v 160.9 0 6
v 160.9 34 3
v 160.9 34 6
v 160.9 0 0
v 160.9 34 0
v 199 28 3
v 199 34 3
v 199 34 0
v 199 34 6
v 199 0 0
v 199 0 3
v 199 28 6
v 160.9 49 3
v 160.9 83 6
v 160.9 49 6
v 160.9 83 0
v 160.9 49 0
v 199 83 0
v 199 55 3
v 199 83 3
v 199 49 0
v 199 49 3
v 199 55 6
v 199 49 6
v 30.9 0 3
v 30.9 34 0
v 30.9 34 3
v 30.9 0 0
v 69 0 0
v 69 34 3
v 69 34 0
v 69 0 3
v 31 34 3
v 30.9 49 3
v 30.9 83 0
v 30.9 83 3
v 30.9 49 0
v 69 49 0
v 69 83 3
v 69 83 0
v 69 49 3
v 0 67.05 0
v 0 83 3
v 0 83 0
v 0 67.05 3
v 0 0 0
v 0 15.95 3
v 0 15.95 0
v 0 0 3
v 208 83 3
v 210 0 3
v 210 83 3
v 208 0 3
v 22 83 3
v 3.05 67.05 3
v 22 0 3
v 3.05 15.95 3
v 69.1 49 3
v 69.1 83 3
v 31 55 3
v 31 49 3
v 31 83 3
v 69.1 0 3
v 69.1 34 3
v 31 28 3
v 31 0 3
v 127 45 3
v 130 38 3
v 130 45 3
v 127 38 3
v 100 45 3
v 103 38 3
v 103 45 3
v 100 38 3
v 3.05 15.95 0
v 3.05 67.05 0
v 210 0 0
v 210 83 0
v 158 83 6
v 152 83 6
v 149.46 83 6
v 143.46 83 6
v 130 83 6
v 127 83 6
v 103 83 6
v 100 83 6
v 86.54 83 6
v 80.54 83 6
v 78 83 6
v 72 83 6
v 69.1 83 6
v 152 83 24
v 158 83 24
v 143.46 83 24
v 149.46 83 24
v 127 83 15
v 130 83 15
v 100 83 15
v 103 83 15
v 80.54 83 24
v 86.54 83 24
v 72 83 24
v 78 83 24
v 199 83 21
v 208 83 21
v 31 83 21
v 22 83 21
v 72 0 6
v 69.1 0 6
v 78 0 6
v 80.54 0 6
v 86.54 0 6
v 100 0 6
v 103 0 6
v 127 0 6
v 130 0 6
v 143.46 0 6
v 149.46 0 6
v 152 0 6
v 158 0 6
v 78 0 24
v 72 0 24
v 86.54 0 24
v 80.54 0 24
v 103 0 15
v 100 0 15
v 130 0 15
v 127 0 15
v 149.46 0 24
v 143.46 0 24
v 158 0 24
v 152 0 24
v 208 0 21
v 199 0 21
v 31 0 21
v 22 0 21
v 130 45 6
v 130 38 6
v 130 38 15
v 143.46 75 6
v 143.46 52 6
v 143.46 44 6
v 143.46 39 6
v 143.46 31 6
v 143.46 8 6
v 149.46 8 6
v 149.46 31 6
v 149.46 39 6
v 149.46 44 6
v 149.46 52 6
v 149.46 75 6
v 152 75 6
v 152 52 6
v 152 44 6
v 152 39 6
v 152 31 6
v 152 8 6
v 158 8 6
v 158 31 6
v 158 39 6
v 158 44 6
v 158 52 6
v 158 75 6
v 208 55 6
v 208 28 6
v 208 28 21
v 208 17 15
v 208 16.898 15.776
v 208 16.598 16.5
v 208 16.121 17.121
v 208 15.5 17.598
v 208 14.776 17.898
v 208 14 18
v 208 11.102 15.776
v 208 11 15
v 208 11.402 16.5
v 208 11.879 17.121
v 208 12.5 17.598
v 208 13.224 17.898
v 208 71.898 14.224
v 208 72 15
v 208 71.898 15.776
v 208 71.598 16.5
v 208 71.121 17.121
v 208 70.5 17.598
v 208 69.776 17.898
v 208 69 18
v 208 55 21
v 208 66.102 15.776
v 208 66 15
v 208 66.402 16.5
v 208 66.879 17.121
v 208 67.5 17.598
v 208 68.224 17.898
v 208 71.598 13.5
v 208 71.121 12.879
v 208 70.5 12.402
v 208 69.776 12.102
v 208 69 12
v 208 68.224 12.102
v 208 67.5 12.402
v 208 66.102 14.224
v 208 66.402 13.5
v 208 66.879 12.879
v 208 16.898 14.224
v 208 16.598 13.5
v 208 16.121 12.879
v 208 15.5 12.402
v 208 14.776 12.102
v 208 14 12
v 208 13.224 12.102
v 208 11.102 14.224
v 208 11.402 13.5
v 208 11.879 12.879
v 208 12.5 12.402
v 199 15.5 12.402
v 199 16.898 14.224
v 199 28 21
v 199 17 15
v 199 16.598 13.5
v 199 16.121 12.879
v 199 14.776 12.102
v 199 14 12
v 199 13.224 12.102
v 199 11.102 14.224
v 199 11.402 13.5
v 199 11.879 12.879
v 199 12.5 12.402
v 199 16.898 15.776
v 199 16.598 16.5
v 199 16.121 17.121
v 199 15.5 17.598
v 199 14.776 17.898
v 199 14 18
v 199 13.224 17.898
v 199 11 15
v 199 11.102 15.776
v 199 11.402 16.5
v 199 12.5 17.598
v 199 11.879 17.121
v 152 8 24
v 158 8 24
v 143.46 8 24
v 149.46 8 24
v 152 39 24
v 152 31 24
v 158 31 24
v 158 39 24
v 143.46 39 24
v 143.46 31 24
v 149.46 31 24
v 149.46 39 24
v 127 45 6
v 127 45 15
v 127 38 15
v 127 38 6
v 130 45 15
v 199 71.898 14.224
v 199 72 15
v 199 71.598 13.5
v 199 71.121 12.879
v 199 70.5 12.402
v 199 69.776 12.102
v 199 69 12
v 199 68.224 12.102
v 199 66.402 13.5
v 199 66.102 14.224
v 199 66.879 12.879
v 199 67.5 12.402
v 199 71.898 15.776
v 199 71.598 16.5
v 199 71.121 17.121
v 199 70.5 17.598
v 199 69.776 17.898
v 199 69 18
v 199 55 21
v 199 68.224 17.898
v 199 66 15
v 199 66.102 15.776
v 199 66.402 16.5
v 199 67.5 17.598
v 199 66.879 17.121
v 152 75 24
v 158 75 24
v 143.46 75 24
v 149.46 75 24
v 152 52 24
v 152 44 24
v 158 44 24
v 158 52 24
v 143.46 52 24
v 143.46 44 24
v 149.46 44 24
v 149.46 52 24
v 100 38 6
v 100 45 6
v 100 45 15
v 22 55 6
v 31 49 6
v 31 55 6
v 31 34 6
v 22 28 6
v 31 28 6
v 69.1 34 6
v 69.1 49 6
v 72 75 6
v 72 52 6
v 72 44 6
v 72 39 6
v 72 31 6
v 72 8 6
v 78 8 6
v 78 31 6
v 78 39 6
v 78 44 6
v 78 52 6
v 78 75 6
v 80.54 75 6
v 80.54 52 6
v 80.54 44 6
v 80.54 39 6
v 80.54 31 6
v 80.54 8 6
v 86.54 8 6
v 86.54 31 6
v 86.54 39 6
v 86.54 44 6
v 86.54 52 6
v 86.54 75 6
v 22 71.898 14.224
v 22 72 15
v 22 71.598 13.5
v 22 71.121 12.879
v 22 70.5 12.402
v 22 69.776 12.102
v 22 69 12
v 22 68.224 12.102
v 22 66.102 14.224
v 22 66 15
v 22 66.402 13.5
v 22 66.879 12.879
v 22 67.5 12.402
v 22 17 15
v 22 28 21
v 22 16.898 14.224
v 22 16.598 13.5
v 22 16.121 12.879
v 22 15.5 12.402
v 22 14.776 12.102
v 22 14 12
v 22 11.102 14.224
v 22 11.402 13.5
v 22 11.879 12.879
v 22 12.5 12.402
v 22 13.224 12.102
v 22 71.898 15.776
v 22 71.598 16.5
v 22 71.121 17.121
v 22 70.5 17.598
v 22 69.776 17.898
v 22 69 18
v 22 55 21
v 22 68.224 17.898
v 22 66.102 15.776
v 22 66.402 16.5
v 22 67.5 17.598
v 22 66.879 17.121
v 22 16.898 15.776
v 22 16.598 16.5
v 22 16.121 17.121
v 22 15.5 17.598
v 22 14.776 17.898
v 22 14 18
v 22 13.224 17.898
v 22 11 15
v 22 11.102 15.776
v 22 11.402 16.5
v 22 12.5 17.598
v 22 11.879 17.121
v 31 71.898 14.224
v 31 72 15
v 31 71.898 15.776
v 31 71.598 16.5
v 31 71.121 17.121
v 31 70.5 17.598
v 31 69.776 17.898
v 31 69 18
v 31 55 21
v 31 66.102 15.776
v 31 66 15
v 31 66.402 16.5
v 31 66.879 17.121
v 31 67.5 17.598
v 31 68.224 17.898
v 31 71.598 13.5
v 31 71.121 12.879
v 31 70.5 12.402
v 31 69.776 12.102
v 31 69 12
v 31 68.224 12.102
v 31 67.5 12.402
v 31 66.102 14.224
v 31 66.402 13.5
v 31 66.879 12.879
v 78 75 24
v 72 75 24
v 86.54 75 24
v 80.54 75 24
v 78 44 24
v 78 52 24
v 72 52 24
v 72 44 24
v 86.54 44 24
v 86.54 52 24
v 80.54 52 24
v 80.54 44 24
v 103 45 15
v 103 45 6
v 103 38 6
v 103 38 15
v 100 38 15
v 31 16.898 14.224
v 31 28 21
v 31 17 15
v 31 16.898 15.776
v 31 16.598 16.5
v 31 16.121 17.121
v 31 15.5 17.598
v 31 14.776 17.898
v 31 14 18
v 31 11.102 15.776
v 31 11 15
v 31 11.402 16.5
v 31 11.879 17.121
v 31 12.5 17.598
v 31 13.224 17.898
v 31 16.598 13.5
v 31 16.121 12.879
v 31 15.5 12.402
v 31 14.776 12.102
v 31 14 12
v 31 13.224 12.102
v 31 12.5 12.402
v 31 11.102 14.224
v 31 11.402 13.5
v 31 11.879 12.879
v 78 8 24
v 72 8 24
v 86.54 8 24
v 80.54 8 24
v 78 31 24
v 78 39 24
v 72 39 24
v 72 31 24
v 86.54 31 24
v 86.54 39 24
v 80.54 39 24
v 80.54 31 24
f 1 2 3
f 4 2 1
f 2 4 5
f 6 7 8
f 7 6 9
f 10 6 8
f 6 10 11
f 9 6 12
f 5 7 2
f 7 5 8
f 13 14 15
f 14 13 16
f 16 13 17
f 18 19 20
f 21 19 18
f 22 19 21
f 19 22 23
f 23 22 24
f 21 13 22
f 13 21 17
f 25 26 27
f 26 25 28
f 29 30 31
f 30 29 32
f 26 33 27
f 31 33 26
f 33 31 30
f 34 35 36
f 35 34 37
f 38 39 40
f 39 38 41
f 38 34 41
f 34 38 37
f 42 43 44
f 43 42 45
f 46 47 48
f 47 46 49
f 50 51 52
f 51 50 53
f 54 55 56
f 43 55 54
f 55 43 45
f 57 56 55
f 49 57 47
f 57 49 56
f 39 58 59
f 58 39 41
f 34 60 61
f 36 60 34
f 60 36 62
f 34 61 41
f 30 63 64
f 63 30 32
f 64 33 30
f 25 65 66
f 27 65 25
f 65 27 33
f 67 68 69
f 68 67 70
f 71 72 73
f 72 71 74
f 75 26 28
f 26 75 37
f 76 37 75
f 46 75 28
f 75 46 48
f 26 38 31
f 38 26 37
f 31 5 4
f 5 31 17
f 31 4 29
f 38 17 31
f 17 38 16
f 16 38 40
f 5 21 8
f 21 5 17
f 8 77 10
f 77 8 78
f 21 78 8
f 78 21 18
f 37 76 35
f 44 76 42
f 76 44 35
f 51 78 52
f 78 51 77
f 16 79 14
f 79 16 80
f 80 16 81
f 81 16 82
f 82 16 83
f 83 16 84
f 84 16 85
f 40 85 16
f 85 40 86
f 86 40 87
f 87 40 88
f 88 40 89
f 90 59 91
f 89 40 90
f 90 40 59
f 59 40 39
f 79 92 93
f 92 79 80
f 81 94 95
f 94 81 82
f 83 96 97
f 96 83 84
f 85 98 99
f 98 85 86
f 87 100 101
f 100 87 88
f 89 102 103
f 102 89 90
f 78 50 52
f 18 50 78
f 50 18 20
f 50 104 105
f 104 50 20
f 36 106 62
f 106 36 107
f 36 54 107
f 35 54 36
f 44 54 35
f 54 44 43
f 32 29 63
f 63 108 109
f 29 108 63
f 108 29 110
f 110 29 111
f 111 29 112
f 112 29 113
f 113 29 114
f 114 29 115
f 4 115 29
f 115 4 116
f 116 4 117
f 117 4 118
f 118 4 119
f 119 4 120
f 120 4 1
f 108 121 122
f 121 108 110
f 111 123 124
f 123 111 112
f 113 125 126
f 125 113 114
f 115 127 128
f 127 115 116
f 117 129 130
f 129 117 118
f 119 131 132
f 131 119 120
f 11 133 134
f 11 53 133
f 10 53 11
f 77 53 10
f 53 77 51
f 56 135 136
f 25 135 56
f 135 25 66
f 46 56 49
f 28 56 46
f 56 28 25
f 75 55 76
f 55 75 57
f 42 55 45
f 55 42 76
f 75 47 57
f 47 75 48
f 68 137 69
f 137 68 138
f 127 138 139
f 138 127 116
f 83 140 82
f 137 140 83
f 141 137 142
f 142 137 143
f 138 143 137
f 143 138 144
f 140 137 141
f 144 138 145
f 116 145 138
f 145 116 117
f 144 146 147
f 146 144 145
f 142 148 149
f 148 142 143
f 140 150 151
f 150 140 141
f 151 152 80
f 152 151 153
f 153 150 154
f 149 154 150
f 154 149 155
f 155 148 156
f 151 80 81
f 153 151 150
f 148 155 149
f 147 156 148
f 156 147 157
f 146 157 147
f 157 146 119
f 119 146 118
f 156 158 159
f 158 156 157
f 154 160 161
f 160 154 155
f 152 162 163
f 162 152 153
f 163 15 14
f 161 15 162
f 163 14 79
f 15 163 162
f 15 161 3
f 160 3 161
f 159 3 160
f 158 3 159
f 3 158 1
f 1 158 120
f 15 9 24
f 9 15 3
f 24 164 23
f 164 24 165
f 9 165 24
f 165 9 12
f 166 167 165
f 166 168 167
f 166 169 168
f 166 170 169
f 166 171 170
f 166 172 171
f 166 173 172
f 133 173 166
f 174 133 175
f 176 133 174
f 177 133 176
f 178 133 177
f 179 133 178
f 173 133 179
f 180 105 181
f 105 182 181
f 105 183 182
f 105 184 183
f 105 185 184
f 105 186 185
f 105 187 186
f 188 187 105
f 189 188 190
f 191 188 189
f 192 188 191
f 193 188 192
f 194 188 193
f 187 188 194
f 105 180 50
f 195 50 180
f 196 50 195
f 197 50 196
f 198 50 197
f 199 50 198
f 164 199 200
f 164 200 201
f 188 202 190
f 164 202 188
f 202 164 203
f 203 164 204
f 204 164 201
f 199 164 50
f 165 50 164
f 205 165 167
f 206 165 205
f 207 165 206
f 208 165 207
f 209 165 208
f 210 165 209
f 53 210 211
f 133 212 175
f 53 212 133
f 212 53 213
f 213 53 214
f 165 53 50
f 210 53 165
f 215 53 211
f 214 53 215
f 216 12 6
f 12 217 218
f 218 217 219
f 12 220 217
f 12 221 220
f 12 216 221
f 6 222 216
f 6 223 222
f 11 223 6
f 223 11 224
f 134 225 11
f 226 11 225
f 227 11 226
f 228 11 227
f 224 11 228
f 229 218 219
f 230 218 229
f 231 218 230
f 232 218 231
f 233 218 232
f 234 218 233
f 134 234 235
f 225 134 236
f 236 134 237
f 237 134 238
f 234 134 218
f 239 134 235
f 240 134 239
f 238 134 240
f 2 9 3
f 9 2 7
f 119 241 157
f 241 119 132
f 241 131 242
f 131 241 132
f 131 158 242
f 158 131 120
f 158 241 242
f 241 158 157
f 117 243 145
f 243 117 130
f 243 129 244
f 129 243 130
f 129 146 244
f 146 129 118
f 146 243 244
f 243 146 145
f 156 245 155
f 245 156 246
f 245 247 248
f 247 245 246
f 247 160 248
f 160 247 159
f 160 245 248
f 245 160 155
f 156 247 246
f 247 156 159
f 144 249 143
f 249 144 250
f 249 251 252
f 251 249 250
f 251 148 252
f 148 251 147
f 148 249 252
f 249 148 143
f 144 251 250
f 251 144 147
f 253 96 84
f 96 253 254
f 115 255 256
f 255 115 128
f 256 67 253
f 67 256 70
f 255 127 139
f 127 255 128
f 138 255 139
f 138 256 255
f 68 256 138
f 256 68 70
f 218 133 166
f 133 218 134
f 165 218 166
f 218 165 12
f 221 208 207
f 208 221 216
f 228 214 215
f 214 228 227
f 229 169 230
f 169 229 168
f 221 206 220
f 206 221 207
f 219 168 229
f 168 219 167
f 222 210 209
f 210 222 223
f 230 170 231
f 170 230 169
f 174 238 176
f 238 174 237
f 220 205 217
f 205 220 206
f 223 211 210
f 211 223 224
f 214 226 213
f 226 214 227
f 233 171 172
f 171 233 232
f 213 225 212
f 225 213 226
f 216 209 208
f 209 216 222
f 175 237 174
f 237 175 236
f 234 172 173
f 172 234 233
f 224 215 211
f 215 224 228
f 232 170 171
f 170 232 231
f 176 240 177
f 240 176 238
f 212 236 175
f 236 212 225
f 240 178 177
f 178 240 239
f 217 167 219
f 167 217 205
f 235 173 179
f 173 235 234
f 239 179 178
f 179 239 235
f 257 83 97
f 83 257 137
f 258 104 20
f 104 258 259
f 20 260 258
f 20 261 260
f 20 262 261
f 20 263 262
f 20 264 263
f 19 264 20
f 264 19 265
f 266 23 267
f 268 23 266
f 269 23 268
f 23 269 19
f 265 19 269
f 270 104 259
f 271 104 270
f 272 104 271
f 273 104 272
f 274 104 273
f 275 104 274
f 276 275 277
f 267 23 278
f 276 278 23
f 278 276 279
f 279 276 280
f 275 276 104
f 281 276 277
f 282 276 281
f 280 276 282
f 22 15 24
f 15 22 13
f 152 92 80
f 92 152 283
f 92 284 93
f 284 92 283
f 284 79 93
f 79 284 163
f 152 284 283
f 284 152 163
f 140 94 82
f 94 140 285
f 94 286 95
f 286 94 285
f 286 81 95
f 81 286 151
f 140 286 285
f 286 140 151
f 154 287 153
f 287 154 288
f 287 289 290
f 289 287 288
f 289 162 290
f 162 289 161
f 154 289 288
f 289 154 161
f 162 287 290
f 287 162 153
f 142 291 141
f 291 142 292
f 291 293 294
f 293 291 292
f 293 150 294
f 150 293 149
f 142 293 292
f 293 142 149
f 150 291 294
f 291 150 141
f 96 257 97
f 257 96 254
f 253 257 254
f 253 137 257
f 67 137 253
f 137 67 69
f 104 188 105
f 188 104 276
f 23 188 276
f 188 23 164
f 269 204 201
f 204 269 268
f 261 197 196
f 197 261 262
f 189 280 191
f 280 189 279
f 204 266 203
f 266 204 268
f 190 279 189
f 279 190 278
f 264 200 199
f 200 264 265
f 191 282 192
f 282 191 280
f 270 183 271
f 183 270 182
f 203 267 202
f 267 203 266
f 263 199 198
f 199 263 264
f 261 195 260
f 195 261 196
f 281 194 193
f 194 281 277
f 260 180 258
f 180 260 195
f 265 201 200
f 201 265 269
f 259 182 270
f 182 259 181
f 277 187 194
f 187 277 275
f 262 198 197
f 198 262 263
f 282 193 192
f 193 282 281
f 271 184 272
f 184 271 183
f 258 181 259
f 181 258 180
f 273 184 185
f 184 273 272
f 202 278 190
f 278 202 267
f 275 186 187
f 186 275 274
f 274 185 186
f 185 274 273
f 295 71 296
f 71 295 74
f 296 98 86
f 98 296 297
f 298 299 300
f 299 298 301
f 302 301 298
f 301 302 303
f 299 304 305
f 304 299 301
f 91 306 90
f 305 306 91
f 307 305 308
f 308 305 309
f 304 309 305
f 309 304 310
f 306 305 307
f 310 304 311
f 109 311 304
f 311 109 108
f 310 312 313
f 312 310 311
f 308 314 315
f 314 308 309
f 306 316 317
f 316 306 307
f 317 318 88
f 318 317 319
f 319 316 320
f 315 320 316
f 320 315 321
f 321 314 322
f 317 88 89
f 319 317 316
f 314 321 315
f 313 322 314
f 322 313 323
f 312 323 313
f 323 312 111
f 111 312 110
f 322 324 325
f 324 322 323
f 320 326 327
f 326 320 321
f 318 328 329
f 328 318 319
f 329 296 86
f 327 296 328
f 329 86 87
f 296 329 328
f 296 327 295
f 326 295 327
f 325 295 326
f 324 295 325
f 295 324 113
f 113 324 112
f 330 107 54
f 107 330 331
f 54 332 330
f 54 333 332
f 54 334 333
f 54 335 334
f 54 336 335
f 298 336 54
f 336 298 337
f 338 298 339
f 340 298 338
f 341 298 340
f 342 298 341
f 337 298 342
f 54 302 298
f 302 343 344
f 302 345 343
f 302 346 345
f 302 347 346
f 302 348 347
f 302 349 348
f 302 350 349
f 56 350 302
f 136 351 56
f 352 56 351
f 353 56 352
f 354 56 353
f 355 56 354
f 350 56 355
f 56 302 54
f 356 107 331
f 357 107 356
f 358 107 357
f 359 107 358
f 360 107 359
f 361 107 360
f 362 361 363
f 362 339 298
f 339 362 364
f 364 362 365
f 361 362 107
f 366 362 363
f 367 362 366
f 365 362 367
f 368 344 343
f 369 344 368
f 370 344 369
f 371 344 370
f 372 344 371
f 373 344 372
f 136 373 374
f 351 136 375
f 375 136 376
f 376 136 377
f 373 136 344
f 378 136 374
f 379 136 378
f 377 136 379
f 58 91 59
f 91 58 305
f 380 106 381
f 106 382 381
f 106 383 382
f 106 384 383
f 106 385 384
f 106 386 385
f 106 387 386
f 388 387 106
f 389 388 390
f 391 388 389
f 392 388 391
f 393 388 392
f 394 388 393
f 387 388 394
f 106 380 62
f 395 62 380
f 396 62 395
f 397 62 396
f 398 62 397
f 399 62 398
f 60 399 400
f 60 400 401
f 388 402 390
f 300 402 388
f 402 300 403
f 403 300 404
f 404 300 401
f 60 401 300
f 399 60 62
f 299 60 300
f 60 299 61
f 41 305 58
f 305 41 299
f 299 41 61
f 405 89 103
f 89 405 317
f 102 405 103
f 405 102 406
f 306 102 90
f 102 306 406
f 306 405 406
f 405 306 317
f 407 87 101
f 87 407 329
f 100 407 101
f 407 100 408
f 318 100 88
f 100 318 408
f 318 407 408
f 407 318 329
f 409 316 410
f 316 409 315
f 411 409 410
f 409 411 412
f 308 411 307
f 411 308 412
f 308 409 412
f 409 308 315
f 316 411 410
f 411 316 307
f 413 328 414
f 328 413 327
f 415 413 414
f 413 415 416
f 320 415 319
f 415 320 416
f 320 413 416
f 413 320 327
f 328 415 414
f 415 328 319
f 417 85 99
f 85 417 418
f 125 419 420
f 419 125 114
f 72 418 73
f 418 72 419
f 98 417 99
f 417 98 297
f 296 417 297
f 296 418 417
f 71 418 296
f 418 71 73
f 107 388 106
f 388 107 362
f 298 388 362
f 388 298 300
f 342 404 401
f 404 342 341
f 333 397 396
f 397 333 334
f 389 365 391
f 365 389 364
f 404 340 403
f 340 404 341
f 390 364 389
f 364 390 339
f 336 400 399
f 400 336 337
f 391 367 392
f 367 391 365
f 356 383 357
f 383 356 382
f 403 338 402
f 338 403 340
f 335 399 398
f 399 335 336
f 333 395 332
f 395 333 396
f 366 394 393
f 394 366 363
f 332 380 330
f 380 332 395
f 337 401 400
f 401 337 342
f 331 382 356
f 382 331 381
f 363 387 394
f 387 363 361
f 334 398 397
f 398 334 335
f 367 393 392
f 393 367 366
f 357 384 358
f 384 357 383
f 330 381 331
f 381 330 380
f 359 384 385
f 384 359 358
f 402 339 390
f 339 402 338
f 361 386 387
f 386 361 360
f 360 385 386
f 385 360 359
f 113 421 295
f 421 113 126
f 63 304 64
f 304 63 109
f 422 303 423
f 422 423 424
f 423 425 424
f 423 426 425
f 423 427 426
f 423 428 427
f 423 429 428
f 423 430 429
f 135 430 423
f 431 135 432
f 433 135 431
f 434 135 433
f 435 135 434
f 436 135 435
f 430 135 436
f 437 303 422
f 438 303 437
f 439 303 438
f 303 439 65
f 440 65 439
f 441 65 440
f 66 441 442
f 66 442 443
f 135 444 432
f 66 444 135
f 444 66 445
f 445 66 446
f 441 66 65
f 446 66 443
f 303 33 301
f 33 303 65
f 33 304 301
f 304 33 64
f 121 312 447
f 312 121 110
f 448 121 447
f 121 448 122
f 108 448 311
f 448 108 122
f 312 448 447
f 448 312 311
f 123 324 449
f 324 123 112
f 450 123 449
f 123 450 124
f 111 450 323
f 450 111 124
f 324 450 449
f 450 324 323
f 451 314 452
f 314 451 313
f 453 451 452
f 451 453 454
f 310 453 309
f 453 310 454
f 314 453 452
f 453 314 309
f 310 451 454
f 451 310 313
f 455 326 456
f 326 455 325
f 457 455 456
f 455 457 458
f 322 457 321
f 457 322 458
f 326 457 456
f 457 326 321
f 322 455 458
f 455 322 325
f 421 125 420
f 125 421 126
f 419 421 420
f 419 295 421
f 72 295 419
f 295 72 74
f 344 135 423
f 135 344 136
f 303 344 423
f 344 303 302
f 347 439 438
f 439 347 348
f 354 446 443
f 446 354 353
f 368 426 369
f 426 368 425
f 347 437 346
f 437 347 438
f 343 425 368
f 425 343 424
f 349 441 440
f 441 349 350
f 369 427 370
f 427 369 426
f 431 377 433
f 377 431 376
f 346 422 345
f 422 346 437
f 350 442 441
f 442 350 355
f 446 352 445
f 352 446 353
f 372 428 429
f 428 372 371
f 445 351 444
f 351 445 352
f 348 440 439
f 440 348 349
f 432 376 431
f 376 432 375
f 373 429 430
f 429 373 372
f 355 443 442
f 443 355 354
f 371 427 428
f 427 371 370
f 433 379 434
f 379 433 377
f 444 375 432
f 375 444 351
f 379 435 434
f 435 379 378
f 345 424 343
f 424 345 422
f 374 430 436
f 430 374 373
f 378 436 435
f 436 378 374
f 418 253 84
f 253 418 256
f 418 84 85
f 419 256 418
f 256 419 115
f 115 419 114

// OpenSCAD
// robot_body.scad
// quadruped robot body

// material is 3mm thick
material = 3; // material thickness [mm]
// a dowel to connect the scapula
dowel = [  // dowel to rotate ulna
    6,     // diameter  [mm]
    15     // length [mm]
];  
module dowel($fn=24) {
  cylinder(d=dowel[0], h=dowel[1],center=true);
}

leg_mg90s_holder = [ // the screwing part
    32.2,  // 21+10,  // length [mm]
    12.2,  // 12,     // width [mm]
    2.54,  // height [mm] >= 2
];
// a mg90s motor
//leg_mg90s_body = [    // the body
//    23,     // 21,    // length [mm]
//    12.4,   // 12,    // width [mm]
//    10,     // height [mm] > 8
//];

// the whole robot body
body = [210,83,material];
// the back part
back = [11,body.y,material];
// the front part
front = [37,body.y,material];
// the middle part
middle = [24,body.y,material];

// small value for proper solid operations
air = [.1,.1,.1];

// size of stick to hold a mg90s motor
leg_motor_stick = [6,8,21];

// distance between 2 stick holders
leg_motor_holder_distance = 
  [leg_mg90s_holder.z, 23, 0];

// distance from start of one stick to the other
leg_motor_stick_distance = 
  leg_motor_stick + leg_motor_holder_distance;
     
module leg_motor_stick() {
  cube(leg_motor_stick);
}

leg = [
  38,
  leg_motor_stick_distance.y+3,
  3*material
];
module leg_cutout() {
  cube(leg+air);
}
module robot_body_legs_cutout() {
  air = 0.1;
  translate([0,0,0])
  leg_cutout();
  translate([0,body.y-leg.y+air,0])
  leg_cutout();
}

// distance between 2 leg holder sticks in x
leg_motor_stick_distance_x = 
  [leg_motor_stick_distance.x, 0, 0];

module leg_motor_holder_side() {
  translate([0,0,0])
  leg_motor_stick();
  translate(leg_motor_stick_distance_x)
  leg_motor_stick();
}
*leg_motor_holder_side();

// distance between 2 leg holder sticks in y
leg_motor_holder_distance_y = 
  [0, leg_motor_stick_distance.y, 0];

module leg_motor_holder() {
  translate([0,0,0])
  leg_motor_holder_side();
  translate(leg_motor_holder_distance_y)
  leg_motor_holder_side();
}
*leg_motor_holder();

motor_plate = 
    [3+6+2+6+11,body.y/2,material];
motor_back_plate = 
    [material,leg.x,15-material];

// single plate with motor holders
module motor_plate_design()
{
  cube(motor_plate);
}

*motor_plate_design();

// d = m3 screw
module leg_holder_screw(d=3.2,h=4*material,$fn=36)
{
  cylinder(d=d,h=h,center=true);
}
module leg_holder_mount()
{
  w = motor_plate.x/2 + material;
  translate([0,-w/2,0])
  leg_holder_screw();
  translate([0,w/2,0])
  leg_holder_screw();
}

leg_holder_plate =
    [motor_plate.x+leg.x+24/2,
     motor_plate.y, 
     material];

module leg_holder_plate() {
  cube(leg_holder_plate);
}

*leg_holder_plate();

module leg_holder_mounts() {
  // mount under motor
  translate([leg.x/2+leg.x+12,(leg.y+material)/2,0])
  leg_holder_mount();
  // mount at dowl holder
  translate([-back.x+15,motor_plate.x,0]) {
    translate([0,4,0])
    leg_holder_screw();
    translate([0,-leg_motor_holder_distance.y,0])
    leg_holder_screw();
  }
}

*leg_holder_mounts();

body_back_x = back.x-leg_dowel_holder().x;

module leg_holder(mounts) {
  difference() {
    leg_holder_plate();
    translate([leg_dowel_holder().x,-.1,-material]) 
    leg_cutout();
    if (mounts)
      leg_holder_mounts();
  }
  // 
  translate([(leg.x+leg_dowel_holder().x),0,0]) {
    translate([material,0,0]) {
      leg_motor_holder();
      translate([motor_plate.x,0,0])
      cube(motor_back_plate);
    }
    translate([body_back_x,0,0])
    translate(-[back.x+leg.x,0,0])
    leg_dowel_holder();
  }
}

*leg_holder();

module back_left_leg_holder(mounts=false) {
    translate([0,body.y,0])
    scale([1,-1,1]) leg_holder(mounts);
}
module back_right_leg_holder(mounts=false) {
    leg_holder(mounts);
}
module back_legs_holders(mounts=false) {
  back_left_leg_holder(mounts);
  back_right_leg_holder(mounts);
}

module front_left_leg_holder(mounts=false) {
  translate([3,0,0])
  scale([-1,1,1]) 
  back_left_leg_holder(mounts);
}

module front_right_leg_holder(mounts=false) {
  translate([3,0,0])
  scale([-1,1,1]) 
  back_right_leg_holder(mounts);
}

module front_legs_holders(mounts=false) {
  front_left_leg_holder(mounts);
  front_right_leg_holder(mounts);
}

function leg_dowel_holder() = [9,28,18];
function leg_dowel_holder_to_holder() = 
    leg_dowel_holder()/2 + [0,0,material];

module leg_dowel_holder() {
  difference() {
    cube(leg_dowel_holder());
    translate(leg_dowel_holder_to_holder()) 
    rotate([0,90,0]) 
    dowel();
  }
}
*leg_dowel_holder();

function hcsr04_cutout() = [
    8+.2, // radius
    4, // offset left/right
    6  // offset top
];
function hcsr04_hole_to_holder() =
    [-.1, 
    hcsr04_cutout()[1]+hcsr04_cutout()[0], 
    hcsr04_holder().z-hcsr04_cutout()[2]-hcsr04_cutout()[0]];

module hcsr04_holder_hole() {
  rotate([0,90,0]) 
  cylinder(r=hcsr04_cutout()[0],h=2*material);
}
function hcsr04_holder() = [3,51,40];
module hcsr04_holder() {
  difference() {
    cube(hcsr04_holder());
    *union() {
      cube(hcsr04_holder());
      translate([material/2,26,18/2+2*material])
      cube([material, 83, 18],center=true);
      }
    translate(hcsr04_hole_to_holder()) {
      hcsr04_holder_hole();
      translate([0,hcsr04_hole_to_holder().z,0])
      hcsr04_holder_hole();
    }
  }
}

*hcsr04_holder();

module robot_leg_holders(mounts=false) {
  translate([body_back_x,0,0])
  back_legs_holders(mounts);
  translate([body.x-front.x,0,0])
  translate([leg_dowel_holder().x+material,0,0])
  front_legs_holders(mounts);
}

*robot_leg_holders();

function right_to_left() =
    [0,body.y-leg.y-3,0];

module robot_back_leg_holder_mounts() {
  // back right
  leg_holder_mounts();
  // back left
  translate(right_to_left())
  leg_holder_mounts();
}

module robot_front_leg_holder_mounts() {
  // front right
  translate([material,0,0])
  scale([-1,1,1]) leg_holder_mounts();
  // front left
  translate(right_to_left())
  translate([material,0,0])
  scale([-1,1,1]) leg_holder_mounts();
}

module robot_leg_holder_mounts()
{
  translate([-material,0,0])
  robot_back_leg_holder_mounts();
  translate([body.x-30,0,0])
  robot_front_leg_holder_mounts();
}

function back_leg_cut_to_body() =
    [back.x-material,0,0];

function front_leg_cut_to_body() =
    [body.x-front.x-leg.x+material,0,0];

function hcsr04_holder_to_body() =
    [body.x-material,
    (body.y-hcsr04_holder().y)/2,
    ];

module front_panel_cutout(air=[0,0,0]) {
  translate([-material/2, 0, material])
  cube([material, 51, 2*material]+air,center=true);
}

module robot_body_base(mounts=false) {
  difference() {
    cube(body);
    translate([3,-air.y,-material]) {
      // back legs coutout
      translate(back_leg_cut_to_body())
      robot_body_legs_cutout();
      // front leg cutout
      translate(front_leg_cut_to_body())
      robot_body_legs_cutout();
      // leg holder mounts
      if (mounts)
        translate([2,0,2*material])
        robot_leg_holder_mounts();
    }
    // front panel holder
    translate([body.x,body.y/2,0])
    front_panel_cutout(air);
    // middle back/front part connector
    if (mounts)
      translate(middle_pos_to_body())
      robot_body_middle_mount();
  }
}

module robot_body_cover_design() {
  x = leg_motor_stick.y + .5; // 8
  y = leg_motor_holder_distance.y - 1; // 22
  z = body.y-2*(x+y); //23;
  r = 17+1; // 17
  s = 17+53+17-2*r; // 53
  pts = [
    [0,r],
    [0, r+s],
    [x, r+s],
    [x, r+s+r],
    [x+y, r+s+r],
    [x+y, r+s],
    [x+y+z, r+s],
    [x+y+z, r+s+r],
    [x+y+z+y, r+s+r],
    [x+y+z+y, r+s],
    [x+y+z+y+x, r+s],
    [x+y+z+y+x, r], 
    [x+y+z+y, r], 
    [x+y+z+y, 0], 
    [x+y+z, 0], 
    [x+y+z, r], 
    [x+y, r], 
    [x+y, 0], 
    [x, 0],
    [x, 17]
  ];
  linear_extrude(height=material) polygon(pts); 

}

function robot_body_cover_center() =
    [(8+22+23+22+8)/2, (17+53+17)/2];

*robot_body_cover_design();

module robot_cover_mount() {
  cylinder(d=3.2, h=2*material,center=true,$fn=12);
}

module robot_body_cover_mounts() {
  translate(robot_body_cover_center())
  translate([0,0,material/2])
  {
    x = 12*2.54;
    y =  7*2.54;
    translate([x,   y,0]) robot_cover_mount();  
    translate([x,  -y,0]) robot_cover_mount();  
    translate([-x,  y,0]) robot_cover_mount();  
    translate([-x, -y,0]) robot_cover_mount();  
  }
}
*robot_body_cover_mounts();

module robot_body_cover(mounts) {
  translate(robot_body_cover_center())
  rotate([0,0,90])
  translate(-robot_body_cover_center())
  if (mounts)
    difference() {
      robot_body_cover_design();
      robot_body_cover_mounts();
    }
  else
    robot_body_cover_design();
}

*robot_body_cover(true);

function robot_cover_to_body() =
    [11+38+3,-2,leg_dowel_holder().z+body.z];

module robot_body_design(front=false, cover=false,mounts=false) {
  //color("BurlyWood")
  union() {
    robot_body_base(mounts);
    // 4 leg motor holders
    translate([0,0,body.z])
    robot_leg_holders(mounts);
    // middle back/front part connector
    translate(middle_pos_to_body())
    robot_body_middle(mounts);
  }
  // front panel (HC_SR04)
  if (front) 
    translate(hcsr04_holder_to_body())
    hcsr04_holder();
  // cover laying on the motor
  if (cover)
    translate(robot_cover_to_body())
    robot_body_cover(cover);
}

*robot_body_design(false, false, false);

function back_part() = 
  [11+38+3+6+2+6+11+3,body.y,material];

function front_part() = 
    [body.x-back_part(),
     back_part().y,
     back_part().z];

function middle_pos_to_body() = 
    [3+(11+38+3+6+2+6+11+3),0,body.z];

function middle_part() = middle;

module robot_body_middle(mounts=false) {
  difference() {
    cube(middle_part());
    if (mounts)
      robot_body_middle_mount();
  }
}

*translate(middle_pos_to_body())
robot_body_middle(true);

module robot_body_back_middle_hole() {
  cylinder(h=6*material, d=3.2,center=true);
}    
module robot_body_back_middle_mount() {
  pos1 = [6,6,-material/2];
  translate(pos1)
  robot_body_back_middle_hole();
  pos2 = [6,body.y-6,-material/2];
  translate(pos2)
  robot_body_back_middle_hole();
  pos3 = [6,body.y/2-6,-material/2];
  translate(pos3)
  robot_body_back_middle_hole();
  pos4 = [6,body.y/2+6,-material/2];
  translate(pos4)
  robot_body_back_middle_hole();
}
module robot_body_front_middle_mount() {
  pos1 = [24-6,6,-material/2];
  translate(pos1)
  robot_body_back_middle_hole();
  pos2 = [24-6,body.y-6,-material/2];
  translate(pos2)
  robot_body_back_middle_hole();
  pos3 = [24-6,body.y/2-6,-material/2];
  translate(pos3)
  robot_body_back_middle_hole();
  pos4 = [24-6,body.y/2+6,-material/2];
  translate(pos4)
  robot_body_back_middle_hole();
}

module robot_body_middle_mount() {
  robot_body_back_middle_mount();
  robot_body_front_middle_mount();   
}

function front_cut() =
  [body.x-back_cut().x,back_cut().y,back_cut().z];

module robot_body_back() {
  difference() {
  *robot_body_design();
  robot_body_base(true);
  cut=front_cut();
  translate([body.x-back_cut().x-24+4,0,0] + cut/2)
  cube(cut+air,center=true);
  }
}

*robot_body_back();

function back_cut() =
  [(11+38+3+6+2+6+11+3)+3+24/2,body.y,2*material];

module robot_body_front() {
  difference() {
    robot_body_base(true);
    cut=back_cut();
    translate(cut/2)
    cube(cut+air,center=true);
  }
}

*robot_body_front();

module robot_body(front=false,cover=false,mounts=false) {
  translate([body.x,0,0])
  scale([-1,1,1])
  robot_body_design(front, cover, mounts);
}
robot_body();
